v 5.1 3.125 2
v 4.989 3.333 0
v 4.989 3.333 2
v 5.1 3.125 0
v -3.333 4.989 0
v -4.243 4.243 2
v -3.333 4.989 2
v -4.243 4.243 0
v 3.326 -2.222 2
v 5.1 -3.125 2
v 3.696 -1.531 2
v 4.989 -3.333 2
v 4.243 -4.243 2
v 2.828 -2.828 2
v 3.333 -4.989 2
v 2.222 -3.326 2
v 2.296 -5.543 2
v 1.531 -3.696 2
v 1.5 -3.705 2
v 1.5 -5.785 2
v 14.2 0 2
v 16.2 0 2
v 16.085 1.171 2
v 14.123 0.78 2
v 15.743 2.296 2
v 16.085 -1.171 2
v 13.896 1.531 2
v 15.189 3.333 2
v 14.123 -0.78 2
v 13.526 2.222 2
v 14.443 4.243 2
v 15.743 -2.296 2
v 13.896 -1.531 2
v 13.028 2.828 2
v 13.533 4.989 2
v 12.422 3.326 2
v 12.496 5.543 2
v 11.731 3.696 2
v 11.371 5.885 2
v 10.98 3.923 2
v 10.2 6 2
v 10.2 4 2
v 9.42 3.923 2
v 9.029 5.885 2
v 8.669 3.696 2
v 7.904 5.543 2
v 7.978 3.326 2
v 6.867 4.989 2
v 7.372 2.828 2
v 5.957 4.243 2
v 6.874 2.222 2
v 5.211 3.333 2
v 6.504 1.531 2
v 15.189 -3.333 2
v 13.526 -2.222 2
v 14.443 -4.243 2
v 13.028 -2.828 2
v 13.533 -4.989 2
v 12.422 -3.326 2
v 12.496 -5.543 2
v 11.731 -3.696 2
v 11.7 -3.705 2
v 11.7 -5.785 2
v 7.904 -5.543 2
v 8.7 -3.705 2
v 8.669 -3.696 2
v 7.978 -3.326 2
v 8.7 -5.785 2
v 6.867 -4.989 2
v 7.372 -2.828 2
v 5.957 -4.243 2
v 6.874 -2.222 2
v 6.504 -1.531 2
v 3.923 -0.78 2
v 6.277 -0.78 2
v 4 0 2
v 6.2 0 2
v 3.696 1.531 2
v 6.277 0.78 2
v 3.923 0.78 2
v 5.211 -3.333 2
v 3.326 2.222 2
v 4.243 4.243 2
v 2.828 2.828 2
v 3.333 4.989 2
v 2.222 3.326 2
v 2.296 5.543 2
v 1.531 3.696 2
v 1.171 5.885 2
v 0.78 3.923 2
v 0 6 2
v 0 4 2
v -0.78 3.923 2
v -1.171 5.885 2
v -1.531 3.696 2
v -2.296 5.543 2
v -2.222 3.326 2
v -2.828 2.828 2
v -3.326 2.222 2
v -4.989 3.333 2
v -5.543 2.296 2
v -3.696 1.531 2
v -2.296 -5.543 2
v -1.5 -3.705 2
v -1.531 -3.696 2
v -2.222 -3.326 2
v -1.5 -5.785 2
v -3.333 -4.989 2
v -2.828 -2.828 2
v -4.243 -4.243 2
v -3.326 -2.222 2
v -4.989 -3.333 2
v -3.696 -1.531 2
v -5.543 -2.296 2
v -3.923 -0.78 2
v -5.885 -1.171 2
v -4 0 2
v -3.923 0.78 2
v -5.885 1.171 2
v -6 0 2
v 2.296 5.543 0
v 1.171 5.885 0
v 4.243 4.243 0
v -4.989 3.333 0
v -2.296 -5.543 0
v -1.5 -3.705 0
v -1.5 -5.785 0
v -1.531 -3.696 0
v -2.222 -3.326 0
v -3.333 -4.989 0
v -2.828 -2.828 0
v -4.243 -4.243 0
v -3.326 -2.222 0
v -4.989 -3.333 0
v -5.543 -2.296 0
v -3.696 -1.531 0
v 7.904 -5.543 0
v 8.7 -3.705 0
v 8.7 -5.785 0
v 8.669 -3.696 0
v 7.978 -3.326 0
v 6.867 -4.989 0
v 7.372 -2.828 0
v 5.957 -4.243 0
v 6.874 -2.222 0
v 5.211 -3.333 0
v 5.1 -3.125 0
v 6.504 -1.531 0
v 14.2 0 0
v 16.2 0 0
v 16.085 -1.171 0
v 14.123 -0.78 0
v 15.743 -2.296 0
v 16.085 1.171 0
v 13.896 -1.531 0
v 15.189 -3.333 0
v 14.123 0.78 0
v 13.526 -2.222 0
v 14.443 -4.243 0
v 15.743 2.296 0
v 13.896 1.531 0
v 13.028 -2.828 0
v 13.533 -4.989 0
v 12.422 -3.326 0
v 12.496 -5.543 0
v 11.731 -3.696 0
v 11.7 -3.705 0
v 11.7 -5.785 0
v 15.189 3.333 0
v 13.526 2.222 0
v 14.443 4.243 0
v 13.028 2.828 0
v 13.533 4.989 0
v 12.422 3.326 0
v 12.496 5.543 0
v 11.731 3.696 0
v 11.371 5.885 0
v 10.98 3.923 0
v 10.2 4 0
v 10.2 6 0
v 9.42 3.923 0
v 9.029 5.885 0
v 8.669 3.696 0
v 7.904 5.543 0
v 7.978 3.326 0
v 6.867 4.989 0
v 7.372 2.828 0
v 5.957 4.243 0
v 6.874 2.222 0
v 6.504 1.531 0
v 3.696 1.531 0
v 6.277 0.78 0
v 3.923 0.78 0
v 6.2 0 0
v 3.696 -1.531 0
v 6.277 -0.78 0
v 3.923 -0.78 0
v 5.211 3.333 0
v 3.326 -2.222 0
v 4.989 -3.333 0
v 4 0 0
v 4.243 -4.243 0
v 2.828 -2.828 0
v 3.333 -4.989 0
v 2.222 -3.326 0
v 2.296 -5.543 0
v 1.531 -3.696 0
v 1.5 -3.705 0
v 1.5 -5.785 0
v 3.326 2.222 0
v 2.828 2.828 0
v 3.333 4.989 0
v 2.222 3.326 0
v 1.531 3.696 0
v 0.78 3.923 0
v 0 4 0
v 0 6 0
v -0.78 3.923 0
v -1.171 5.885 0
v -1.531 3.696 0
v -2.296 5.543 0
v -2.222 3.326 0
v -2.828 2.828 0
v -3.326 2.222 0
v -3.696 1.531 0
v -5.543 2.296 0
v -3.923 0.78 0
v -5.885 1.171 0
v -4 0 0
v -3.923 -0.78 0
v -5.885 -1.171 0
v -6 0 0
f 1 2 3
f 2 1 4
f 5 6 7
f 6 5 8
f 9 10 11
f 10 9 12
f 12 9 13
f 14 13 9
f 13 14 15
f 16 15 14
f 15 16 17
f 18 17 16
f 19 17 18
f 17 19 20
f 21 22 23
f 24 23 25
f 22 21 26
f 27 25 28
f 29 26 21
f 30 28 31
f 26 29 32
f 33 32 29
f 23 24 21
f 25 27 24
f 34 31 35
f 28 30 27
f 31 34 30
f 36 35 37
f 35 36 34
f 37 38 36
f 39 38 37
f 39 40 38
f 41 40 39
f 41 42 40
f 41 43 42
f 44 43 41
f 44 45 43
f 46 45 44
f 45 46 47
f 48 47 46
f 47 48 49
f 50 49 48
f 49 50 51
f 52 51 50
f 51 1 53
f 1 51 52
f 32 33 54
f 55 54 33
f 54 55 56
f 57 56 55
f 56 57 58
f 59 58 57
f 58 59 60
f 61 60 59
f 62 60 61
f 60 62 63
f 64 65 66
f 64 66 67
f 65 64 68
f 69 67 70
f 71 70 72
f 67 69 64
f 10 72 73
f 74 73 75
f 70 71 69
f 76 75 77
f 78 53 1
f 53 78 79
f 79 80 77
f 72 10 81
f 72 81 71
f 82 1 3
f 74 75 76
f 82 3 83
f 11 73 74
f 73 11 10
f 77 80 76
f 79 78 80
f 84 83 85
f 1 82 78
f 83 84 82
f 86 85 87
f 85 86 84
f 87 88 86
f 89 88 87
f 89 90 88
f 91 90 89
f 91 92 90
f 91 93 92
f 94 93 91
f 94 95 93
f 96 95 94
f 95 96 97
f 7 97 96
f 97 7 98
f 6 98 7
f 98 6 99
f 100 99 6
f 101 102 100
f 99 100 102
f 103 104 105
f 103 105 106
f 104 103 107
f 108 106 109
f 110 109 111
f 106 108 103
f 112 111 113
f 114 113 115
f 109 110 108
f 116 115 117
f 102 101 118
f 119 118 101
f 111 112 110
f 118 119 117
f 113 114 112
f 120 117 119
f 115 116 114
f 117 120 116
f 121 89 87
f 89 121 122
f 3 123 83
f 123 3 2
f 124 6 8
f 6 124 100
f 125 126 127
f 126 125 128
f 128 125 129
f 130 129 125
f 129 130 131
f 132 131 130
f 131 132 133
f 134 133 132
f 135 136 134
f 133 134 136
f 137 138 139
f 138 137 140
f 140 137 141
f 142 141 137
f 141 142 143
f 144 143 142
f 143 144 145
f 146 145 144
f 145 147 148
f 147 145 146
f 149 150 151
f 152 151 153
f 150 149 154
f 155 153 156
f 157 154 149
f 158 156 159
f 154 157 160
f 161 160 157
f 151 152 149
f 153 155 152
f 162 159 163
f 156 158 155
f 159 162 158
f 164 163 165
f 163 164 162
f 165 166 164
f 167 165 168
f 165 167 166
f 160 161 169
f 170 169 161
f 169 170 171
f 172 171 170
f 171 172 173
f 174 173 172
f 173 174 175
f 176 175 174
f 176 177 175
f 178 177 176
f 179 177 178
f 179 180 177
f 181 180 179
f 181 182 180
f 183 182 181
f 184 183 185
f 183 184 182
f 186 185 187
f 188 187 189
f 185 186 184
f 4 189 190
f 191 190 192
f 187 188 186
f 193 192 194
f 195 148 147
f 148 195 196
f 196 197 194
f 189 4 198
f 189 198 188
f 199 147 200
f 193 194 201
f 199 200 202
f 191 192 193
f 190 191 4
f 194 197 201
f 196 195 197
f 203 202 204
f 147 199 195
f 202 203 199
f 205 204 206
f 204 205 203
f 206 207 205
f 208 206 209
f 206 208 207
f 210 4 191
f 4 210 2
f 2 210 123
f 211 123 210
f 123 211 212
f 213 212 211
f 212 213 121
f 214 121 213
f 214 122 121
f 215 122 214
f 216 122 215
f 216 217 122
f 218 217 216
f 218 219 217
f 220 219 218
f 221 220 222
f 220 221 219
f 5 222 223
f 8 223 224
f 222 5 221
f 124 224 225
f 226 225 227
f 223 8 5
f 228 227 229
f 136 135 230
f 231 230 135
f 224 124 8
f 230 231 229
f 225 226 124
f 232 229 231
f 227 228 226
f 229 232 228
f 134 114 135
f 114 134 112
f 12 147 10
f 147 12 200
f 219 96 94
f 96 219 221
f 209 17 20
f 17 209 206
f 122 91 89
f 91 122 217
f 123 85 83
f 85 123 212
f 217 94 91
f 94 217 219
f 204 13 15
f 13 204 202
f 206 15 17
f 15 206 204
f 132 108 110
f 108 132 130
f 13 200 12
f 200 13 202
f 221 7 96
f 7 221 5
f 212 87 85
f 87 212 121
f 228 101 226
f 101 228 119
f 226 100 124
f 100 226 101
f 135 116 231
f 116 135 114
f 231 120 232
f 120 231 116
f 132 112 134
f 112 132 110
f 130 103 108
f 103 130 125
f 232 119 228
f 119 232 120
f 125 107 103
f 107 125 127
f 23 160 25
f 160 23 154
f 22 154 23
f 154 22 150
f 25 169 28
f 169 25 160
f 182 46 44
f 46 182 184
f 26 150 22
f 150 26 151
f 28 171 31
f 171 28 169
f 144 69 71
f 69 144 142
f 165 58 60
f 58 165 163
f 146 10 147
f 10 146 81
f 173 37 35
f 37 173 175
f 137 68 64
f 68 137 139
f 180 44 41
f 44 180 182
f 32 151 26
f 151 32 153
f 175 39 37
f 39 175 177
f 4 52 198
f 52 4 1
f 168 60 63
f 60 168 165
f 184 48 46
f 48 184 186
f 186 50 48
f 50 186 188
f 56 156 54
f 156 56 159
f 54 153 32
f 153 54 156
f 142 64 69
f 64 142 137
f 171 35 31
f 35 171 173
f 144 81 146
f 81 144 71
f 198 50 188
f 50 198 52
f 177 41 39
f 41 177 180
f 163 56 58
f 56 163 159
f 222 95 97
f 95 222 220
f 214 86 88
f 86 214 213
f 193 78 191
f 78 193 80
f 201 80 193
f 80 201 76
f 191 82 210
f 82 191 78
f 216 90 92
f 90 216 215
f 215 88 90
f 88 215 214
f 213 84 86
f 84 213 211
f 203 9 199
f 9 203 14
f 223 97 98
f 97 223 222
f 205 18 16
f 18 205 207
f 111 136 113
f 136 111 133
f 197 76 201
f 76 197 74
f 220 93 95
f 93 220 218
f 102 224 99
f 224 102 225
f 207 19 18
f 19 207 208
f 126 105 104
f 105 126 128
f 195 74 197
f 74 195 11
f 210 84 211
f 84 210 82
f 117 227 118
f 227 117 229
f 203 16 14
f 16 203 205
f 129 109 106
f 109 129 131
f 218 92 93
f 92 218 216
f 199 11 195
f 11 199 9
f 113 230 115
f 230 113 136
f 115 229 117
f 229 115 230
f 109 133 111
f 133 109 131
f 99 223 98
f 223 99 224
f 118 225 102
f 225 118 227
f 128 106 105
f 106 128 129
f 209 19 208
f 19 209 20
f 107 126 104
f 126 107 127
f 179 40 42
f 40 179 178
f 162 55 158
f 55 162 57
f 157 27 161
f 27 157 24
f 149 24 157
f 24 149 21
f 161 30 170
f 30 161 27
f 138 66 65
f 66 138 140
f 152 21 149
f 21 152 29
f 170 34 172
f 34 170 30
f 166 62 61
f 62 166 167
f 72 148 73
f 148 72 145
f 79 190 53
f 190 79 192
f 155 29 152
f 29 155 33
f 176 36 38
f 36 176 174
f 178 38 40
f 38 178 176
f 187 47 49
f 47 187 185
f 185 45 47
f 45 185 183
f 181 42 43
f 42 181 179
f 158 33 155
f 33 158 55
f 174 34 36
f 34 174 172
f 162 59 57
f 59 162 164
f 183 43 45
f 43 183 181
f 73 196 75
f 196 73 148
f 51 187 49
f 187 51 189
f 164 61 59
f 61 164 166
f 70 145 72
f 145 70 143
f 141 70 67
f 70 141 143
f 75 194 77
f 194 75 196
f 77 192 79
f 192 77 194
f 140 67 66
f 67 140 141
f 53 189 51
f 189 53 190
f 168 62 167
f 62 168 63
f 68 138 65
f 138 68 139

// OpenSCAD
//  MultiClip.scad    Mehrfachclip für Schläuche

num = 2;
dist = -1.8;
wall = 2;
gap = 3;
hole_dia = 8;
height = 2;

$fn = 32;
eps = 0.05;

total_dist = hole_dia + 2*wall + dist;

difference() {
    union() {
        translate([0, -wall, 0])
            cube([(num-1)*total_dist, 2*wall, height], center=false);
        for(i=[0:num-1])
            translate([i*total_dist,0,0])
            cylinder(h=height, d=hole_dia+2*wall);
    }
    for(i=[0:num-1]) {
        translate([i*total_dist,0,-5])
            cylinder(h=height+10, d=hole_dia);
        translate([i*total_dist - gap/2, -total_dist,-5])
            cube([gap, total_dist, height+10], center=false);
    }
}
